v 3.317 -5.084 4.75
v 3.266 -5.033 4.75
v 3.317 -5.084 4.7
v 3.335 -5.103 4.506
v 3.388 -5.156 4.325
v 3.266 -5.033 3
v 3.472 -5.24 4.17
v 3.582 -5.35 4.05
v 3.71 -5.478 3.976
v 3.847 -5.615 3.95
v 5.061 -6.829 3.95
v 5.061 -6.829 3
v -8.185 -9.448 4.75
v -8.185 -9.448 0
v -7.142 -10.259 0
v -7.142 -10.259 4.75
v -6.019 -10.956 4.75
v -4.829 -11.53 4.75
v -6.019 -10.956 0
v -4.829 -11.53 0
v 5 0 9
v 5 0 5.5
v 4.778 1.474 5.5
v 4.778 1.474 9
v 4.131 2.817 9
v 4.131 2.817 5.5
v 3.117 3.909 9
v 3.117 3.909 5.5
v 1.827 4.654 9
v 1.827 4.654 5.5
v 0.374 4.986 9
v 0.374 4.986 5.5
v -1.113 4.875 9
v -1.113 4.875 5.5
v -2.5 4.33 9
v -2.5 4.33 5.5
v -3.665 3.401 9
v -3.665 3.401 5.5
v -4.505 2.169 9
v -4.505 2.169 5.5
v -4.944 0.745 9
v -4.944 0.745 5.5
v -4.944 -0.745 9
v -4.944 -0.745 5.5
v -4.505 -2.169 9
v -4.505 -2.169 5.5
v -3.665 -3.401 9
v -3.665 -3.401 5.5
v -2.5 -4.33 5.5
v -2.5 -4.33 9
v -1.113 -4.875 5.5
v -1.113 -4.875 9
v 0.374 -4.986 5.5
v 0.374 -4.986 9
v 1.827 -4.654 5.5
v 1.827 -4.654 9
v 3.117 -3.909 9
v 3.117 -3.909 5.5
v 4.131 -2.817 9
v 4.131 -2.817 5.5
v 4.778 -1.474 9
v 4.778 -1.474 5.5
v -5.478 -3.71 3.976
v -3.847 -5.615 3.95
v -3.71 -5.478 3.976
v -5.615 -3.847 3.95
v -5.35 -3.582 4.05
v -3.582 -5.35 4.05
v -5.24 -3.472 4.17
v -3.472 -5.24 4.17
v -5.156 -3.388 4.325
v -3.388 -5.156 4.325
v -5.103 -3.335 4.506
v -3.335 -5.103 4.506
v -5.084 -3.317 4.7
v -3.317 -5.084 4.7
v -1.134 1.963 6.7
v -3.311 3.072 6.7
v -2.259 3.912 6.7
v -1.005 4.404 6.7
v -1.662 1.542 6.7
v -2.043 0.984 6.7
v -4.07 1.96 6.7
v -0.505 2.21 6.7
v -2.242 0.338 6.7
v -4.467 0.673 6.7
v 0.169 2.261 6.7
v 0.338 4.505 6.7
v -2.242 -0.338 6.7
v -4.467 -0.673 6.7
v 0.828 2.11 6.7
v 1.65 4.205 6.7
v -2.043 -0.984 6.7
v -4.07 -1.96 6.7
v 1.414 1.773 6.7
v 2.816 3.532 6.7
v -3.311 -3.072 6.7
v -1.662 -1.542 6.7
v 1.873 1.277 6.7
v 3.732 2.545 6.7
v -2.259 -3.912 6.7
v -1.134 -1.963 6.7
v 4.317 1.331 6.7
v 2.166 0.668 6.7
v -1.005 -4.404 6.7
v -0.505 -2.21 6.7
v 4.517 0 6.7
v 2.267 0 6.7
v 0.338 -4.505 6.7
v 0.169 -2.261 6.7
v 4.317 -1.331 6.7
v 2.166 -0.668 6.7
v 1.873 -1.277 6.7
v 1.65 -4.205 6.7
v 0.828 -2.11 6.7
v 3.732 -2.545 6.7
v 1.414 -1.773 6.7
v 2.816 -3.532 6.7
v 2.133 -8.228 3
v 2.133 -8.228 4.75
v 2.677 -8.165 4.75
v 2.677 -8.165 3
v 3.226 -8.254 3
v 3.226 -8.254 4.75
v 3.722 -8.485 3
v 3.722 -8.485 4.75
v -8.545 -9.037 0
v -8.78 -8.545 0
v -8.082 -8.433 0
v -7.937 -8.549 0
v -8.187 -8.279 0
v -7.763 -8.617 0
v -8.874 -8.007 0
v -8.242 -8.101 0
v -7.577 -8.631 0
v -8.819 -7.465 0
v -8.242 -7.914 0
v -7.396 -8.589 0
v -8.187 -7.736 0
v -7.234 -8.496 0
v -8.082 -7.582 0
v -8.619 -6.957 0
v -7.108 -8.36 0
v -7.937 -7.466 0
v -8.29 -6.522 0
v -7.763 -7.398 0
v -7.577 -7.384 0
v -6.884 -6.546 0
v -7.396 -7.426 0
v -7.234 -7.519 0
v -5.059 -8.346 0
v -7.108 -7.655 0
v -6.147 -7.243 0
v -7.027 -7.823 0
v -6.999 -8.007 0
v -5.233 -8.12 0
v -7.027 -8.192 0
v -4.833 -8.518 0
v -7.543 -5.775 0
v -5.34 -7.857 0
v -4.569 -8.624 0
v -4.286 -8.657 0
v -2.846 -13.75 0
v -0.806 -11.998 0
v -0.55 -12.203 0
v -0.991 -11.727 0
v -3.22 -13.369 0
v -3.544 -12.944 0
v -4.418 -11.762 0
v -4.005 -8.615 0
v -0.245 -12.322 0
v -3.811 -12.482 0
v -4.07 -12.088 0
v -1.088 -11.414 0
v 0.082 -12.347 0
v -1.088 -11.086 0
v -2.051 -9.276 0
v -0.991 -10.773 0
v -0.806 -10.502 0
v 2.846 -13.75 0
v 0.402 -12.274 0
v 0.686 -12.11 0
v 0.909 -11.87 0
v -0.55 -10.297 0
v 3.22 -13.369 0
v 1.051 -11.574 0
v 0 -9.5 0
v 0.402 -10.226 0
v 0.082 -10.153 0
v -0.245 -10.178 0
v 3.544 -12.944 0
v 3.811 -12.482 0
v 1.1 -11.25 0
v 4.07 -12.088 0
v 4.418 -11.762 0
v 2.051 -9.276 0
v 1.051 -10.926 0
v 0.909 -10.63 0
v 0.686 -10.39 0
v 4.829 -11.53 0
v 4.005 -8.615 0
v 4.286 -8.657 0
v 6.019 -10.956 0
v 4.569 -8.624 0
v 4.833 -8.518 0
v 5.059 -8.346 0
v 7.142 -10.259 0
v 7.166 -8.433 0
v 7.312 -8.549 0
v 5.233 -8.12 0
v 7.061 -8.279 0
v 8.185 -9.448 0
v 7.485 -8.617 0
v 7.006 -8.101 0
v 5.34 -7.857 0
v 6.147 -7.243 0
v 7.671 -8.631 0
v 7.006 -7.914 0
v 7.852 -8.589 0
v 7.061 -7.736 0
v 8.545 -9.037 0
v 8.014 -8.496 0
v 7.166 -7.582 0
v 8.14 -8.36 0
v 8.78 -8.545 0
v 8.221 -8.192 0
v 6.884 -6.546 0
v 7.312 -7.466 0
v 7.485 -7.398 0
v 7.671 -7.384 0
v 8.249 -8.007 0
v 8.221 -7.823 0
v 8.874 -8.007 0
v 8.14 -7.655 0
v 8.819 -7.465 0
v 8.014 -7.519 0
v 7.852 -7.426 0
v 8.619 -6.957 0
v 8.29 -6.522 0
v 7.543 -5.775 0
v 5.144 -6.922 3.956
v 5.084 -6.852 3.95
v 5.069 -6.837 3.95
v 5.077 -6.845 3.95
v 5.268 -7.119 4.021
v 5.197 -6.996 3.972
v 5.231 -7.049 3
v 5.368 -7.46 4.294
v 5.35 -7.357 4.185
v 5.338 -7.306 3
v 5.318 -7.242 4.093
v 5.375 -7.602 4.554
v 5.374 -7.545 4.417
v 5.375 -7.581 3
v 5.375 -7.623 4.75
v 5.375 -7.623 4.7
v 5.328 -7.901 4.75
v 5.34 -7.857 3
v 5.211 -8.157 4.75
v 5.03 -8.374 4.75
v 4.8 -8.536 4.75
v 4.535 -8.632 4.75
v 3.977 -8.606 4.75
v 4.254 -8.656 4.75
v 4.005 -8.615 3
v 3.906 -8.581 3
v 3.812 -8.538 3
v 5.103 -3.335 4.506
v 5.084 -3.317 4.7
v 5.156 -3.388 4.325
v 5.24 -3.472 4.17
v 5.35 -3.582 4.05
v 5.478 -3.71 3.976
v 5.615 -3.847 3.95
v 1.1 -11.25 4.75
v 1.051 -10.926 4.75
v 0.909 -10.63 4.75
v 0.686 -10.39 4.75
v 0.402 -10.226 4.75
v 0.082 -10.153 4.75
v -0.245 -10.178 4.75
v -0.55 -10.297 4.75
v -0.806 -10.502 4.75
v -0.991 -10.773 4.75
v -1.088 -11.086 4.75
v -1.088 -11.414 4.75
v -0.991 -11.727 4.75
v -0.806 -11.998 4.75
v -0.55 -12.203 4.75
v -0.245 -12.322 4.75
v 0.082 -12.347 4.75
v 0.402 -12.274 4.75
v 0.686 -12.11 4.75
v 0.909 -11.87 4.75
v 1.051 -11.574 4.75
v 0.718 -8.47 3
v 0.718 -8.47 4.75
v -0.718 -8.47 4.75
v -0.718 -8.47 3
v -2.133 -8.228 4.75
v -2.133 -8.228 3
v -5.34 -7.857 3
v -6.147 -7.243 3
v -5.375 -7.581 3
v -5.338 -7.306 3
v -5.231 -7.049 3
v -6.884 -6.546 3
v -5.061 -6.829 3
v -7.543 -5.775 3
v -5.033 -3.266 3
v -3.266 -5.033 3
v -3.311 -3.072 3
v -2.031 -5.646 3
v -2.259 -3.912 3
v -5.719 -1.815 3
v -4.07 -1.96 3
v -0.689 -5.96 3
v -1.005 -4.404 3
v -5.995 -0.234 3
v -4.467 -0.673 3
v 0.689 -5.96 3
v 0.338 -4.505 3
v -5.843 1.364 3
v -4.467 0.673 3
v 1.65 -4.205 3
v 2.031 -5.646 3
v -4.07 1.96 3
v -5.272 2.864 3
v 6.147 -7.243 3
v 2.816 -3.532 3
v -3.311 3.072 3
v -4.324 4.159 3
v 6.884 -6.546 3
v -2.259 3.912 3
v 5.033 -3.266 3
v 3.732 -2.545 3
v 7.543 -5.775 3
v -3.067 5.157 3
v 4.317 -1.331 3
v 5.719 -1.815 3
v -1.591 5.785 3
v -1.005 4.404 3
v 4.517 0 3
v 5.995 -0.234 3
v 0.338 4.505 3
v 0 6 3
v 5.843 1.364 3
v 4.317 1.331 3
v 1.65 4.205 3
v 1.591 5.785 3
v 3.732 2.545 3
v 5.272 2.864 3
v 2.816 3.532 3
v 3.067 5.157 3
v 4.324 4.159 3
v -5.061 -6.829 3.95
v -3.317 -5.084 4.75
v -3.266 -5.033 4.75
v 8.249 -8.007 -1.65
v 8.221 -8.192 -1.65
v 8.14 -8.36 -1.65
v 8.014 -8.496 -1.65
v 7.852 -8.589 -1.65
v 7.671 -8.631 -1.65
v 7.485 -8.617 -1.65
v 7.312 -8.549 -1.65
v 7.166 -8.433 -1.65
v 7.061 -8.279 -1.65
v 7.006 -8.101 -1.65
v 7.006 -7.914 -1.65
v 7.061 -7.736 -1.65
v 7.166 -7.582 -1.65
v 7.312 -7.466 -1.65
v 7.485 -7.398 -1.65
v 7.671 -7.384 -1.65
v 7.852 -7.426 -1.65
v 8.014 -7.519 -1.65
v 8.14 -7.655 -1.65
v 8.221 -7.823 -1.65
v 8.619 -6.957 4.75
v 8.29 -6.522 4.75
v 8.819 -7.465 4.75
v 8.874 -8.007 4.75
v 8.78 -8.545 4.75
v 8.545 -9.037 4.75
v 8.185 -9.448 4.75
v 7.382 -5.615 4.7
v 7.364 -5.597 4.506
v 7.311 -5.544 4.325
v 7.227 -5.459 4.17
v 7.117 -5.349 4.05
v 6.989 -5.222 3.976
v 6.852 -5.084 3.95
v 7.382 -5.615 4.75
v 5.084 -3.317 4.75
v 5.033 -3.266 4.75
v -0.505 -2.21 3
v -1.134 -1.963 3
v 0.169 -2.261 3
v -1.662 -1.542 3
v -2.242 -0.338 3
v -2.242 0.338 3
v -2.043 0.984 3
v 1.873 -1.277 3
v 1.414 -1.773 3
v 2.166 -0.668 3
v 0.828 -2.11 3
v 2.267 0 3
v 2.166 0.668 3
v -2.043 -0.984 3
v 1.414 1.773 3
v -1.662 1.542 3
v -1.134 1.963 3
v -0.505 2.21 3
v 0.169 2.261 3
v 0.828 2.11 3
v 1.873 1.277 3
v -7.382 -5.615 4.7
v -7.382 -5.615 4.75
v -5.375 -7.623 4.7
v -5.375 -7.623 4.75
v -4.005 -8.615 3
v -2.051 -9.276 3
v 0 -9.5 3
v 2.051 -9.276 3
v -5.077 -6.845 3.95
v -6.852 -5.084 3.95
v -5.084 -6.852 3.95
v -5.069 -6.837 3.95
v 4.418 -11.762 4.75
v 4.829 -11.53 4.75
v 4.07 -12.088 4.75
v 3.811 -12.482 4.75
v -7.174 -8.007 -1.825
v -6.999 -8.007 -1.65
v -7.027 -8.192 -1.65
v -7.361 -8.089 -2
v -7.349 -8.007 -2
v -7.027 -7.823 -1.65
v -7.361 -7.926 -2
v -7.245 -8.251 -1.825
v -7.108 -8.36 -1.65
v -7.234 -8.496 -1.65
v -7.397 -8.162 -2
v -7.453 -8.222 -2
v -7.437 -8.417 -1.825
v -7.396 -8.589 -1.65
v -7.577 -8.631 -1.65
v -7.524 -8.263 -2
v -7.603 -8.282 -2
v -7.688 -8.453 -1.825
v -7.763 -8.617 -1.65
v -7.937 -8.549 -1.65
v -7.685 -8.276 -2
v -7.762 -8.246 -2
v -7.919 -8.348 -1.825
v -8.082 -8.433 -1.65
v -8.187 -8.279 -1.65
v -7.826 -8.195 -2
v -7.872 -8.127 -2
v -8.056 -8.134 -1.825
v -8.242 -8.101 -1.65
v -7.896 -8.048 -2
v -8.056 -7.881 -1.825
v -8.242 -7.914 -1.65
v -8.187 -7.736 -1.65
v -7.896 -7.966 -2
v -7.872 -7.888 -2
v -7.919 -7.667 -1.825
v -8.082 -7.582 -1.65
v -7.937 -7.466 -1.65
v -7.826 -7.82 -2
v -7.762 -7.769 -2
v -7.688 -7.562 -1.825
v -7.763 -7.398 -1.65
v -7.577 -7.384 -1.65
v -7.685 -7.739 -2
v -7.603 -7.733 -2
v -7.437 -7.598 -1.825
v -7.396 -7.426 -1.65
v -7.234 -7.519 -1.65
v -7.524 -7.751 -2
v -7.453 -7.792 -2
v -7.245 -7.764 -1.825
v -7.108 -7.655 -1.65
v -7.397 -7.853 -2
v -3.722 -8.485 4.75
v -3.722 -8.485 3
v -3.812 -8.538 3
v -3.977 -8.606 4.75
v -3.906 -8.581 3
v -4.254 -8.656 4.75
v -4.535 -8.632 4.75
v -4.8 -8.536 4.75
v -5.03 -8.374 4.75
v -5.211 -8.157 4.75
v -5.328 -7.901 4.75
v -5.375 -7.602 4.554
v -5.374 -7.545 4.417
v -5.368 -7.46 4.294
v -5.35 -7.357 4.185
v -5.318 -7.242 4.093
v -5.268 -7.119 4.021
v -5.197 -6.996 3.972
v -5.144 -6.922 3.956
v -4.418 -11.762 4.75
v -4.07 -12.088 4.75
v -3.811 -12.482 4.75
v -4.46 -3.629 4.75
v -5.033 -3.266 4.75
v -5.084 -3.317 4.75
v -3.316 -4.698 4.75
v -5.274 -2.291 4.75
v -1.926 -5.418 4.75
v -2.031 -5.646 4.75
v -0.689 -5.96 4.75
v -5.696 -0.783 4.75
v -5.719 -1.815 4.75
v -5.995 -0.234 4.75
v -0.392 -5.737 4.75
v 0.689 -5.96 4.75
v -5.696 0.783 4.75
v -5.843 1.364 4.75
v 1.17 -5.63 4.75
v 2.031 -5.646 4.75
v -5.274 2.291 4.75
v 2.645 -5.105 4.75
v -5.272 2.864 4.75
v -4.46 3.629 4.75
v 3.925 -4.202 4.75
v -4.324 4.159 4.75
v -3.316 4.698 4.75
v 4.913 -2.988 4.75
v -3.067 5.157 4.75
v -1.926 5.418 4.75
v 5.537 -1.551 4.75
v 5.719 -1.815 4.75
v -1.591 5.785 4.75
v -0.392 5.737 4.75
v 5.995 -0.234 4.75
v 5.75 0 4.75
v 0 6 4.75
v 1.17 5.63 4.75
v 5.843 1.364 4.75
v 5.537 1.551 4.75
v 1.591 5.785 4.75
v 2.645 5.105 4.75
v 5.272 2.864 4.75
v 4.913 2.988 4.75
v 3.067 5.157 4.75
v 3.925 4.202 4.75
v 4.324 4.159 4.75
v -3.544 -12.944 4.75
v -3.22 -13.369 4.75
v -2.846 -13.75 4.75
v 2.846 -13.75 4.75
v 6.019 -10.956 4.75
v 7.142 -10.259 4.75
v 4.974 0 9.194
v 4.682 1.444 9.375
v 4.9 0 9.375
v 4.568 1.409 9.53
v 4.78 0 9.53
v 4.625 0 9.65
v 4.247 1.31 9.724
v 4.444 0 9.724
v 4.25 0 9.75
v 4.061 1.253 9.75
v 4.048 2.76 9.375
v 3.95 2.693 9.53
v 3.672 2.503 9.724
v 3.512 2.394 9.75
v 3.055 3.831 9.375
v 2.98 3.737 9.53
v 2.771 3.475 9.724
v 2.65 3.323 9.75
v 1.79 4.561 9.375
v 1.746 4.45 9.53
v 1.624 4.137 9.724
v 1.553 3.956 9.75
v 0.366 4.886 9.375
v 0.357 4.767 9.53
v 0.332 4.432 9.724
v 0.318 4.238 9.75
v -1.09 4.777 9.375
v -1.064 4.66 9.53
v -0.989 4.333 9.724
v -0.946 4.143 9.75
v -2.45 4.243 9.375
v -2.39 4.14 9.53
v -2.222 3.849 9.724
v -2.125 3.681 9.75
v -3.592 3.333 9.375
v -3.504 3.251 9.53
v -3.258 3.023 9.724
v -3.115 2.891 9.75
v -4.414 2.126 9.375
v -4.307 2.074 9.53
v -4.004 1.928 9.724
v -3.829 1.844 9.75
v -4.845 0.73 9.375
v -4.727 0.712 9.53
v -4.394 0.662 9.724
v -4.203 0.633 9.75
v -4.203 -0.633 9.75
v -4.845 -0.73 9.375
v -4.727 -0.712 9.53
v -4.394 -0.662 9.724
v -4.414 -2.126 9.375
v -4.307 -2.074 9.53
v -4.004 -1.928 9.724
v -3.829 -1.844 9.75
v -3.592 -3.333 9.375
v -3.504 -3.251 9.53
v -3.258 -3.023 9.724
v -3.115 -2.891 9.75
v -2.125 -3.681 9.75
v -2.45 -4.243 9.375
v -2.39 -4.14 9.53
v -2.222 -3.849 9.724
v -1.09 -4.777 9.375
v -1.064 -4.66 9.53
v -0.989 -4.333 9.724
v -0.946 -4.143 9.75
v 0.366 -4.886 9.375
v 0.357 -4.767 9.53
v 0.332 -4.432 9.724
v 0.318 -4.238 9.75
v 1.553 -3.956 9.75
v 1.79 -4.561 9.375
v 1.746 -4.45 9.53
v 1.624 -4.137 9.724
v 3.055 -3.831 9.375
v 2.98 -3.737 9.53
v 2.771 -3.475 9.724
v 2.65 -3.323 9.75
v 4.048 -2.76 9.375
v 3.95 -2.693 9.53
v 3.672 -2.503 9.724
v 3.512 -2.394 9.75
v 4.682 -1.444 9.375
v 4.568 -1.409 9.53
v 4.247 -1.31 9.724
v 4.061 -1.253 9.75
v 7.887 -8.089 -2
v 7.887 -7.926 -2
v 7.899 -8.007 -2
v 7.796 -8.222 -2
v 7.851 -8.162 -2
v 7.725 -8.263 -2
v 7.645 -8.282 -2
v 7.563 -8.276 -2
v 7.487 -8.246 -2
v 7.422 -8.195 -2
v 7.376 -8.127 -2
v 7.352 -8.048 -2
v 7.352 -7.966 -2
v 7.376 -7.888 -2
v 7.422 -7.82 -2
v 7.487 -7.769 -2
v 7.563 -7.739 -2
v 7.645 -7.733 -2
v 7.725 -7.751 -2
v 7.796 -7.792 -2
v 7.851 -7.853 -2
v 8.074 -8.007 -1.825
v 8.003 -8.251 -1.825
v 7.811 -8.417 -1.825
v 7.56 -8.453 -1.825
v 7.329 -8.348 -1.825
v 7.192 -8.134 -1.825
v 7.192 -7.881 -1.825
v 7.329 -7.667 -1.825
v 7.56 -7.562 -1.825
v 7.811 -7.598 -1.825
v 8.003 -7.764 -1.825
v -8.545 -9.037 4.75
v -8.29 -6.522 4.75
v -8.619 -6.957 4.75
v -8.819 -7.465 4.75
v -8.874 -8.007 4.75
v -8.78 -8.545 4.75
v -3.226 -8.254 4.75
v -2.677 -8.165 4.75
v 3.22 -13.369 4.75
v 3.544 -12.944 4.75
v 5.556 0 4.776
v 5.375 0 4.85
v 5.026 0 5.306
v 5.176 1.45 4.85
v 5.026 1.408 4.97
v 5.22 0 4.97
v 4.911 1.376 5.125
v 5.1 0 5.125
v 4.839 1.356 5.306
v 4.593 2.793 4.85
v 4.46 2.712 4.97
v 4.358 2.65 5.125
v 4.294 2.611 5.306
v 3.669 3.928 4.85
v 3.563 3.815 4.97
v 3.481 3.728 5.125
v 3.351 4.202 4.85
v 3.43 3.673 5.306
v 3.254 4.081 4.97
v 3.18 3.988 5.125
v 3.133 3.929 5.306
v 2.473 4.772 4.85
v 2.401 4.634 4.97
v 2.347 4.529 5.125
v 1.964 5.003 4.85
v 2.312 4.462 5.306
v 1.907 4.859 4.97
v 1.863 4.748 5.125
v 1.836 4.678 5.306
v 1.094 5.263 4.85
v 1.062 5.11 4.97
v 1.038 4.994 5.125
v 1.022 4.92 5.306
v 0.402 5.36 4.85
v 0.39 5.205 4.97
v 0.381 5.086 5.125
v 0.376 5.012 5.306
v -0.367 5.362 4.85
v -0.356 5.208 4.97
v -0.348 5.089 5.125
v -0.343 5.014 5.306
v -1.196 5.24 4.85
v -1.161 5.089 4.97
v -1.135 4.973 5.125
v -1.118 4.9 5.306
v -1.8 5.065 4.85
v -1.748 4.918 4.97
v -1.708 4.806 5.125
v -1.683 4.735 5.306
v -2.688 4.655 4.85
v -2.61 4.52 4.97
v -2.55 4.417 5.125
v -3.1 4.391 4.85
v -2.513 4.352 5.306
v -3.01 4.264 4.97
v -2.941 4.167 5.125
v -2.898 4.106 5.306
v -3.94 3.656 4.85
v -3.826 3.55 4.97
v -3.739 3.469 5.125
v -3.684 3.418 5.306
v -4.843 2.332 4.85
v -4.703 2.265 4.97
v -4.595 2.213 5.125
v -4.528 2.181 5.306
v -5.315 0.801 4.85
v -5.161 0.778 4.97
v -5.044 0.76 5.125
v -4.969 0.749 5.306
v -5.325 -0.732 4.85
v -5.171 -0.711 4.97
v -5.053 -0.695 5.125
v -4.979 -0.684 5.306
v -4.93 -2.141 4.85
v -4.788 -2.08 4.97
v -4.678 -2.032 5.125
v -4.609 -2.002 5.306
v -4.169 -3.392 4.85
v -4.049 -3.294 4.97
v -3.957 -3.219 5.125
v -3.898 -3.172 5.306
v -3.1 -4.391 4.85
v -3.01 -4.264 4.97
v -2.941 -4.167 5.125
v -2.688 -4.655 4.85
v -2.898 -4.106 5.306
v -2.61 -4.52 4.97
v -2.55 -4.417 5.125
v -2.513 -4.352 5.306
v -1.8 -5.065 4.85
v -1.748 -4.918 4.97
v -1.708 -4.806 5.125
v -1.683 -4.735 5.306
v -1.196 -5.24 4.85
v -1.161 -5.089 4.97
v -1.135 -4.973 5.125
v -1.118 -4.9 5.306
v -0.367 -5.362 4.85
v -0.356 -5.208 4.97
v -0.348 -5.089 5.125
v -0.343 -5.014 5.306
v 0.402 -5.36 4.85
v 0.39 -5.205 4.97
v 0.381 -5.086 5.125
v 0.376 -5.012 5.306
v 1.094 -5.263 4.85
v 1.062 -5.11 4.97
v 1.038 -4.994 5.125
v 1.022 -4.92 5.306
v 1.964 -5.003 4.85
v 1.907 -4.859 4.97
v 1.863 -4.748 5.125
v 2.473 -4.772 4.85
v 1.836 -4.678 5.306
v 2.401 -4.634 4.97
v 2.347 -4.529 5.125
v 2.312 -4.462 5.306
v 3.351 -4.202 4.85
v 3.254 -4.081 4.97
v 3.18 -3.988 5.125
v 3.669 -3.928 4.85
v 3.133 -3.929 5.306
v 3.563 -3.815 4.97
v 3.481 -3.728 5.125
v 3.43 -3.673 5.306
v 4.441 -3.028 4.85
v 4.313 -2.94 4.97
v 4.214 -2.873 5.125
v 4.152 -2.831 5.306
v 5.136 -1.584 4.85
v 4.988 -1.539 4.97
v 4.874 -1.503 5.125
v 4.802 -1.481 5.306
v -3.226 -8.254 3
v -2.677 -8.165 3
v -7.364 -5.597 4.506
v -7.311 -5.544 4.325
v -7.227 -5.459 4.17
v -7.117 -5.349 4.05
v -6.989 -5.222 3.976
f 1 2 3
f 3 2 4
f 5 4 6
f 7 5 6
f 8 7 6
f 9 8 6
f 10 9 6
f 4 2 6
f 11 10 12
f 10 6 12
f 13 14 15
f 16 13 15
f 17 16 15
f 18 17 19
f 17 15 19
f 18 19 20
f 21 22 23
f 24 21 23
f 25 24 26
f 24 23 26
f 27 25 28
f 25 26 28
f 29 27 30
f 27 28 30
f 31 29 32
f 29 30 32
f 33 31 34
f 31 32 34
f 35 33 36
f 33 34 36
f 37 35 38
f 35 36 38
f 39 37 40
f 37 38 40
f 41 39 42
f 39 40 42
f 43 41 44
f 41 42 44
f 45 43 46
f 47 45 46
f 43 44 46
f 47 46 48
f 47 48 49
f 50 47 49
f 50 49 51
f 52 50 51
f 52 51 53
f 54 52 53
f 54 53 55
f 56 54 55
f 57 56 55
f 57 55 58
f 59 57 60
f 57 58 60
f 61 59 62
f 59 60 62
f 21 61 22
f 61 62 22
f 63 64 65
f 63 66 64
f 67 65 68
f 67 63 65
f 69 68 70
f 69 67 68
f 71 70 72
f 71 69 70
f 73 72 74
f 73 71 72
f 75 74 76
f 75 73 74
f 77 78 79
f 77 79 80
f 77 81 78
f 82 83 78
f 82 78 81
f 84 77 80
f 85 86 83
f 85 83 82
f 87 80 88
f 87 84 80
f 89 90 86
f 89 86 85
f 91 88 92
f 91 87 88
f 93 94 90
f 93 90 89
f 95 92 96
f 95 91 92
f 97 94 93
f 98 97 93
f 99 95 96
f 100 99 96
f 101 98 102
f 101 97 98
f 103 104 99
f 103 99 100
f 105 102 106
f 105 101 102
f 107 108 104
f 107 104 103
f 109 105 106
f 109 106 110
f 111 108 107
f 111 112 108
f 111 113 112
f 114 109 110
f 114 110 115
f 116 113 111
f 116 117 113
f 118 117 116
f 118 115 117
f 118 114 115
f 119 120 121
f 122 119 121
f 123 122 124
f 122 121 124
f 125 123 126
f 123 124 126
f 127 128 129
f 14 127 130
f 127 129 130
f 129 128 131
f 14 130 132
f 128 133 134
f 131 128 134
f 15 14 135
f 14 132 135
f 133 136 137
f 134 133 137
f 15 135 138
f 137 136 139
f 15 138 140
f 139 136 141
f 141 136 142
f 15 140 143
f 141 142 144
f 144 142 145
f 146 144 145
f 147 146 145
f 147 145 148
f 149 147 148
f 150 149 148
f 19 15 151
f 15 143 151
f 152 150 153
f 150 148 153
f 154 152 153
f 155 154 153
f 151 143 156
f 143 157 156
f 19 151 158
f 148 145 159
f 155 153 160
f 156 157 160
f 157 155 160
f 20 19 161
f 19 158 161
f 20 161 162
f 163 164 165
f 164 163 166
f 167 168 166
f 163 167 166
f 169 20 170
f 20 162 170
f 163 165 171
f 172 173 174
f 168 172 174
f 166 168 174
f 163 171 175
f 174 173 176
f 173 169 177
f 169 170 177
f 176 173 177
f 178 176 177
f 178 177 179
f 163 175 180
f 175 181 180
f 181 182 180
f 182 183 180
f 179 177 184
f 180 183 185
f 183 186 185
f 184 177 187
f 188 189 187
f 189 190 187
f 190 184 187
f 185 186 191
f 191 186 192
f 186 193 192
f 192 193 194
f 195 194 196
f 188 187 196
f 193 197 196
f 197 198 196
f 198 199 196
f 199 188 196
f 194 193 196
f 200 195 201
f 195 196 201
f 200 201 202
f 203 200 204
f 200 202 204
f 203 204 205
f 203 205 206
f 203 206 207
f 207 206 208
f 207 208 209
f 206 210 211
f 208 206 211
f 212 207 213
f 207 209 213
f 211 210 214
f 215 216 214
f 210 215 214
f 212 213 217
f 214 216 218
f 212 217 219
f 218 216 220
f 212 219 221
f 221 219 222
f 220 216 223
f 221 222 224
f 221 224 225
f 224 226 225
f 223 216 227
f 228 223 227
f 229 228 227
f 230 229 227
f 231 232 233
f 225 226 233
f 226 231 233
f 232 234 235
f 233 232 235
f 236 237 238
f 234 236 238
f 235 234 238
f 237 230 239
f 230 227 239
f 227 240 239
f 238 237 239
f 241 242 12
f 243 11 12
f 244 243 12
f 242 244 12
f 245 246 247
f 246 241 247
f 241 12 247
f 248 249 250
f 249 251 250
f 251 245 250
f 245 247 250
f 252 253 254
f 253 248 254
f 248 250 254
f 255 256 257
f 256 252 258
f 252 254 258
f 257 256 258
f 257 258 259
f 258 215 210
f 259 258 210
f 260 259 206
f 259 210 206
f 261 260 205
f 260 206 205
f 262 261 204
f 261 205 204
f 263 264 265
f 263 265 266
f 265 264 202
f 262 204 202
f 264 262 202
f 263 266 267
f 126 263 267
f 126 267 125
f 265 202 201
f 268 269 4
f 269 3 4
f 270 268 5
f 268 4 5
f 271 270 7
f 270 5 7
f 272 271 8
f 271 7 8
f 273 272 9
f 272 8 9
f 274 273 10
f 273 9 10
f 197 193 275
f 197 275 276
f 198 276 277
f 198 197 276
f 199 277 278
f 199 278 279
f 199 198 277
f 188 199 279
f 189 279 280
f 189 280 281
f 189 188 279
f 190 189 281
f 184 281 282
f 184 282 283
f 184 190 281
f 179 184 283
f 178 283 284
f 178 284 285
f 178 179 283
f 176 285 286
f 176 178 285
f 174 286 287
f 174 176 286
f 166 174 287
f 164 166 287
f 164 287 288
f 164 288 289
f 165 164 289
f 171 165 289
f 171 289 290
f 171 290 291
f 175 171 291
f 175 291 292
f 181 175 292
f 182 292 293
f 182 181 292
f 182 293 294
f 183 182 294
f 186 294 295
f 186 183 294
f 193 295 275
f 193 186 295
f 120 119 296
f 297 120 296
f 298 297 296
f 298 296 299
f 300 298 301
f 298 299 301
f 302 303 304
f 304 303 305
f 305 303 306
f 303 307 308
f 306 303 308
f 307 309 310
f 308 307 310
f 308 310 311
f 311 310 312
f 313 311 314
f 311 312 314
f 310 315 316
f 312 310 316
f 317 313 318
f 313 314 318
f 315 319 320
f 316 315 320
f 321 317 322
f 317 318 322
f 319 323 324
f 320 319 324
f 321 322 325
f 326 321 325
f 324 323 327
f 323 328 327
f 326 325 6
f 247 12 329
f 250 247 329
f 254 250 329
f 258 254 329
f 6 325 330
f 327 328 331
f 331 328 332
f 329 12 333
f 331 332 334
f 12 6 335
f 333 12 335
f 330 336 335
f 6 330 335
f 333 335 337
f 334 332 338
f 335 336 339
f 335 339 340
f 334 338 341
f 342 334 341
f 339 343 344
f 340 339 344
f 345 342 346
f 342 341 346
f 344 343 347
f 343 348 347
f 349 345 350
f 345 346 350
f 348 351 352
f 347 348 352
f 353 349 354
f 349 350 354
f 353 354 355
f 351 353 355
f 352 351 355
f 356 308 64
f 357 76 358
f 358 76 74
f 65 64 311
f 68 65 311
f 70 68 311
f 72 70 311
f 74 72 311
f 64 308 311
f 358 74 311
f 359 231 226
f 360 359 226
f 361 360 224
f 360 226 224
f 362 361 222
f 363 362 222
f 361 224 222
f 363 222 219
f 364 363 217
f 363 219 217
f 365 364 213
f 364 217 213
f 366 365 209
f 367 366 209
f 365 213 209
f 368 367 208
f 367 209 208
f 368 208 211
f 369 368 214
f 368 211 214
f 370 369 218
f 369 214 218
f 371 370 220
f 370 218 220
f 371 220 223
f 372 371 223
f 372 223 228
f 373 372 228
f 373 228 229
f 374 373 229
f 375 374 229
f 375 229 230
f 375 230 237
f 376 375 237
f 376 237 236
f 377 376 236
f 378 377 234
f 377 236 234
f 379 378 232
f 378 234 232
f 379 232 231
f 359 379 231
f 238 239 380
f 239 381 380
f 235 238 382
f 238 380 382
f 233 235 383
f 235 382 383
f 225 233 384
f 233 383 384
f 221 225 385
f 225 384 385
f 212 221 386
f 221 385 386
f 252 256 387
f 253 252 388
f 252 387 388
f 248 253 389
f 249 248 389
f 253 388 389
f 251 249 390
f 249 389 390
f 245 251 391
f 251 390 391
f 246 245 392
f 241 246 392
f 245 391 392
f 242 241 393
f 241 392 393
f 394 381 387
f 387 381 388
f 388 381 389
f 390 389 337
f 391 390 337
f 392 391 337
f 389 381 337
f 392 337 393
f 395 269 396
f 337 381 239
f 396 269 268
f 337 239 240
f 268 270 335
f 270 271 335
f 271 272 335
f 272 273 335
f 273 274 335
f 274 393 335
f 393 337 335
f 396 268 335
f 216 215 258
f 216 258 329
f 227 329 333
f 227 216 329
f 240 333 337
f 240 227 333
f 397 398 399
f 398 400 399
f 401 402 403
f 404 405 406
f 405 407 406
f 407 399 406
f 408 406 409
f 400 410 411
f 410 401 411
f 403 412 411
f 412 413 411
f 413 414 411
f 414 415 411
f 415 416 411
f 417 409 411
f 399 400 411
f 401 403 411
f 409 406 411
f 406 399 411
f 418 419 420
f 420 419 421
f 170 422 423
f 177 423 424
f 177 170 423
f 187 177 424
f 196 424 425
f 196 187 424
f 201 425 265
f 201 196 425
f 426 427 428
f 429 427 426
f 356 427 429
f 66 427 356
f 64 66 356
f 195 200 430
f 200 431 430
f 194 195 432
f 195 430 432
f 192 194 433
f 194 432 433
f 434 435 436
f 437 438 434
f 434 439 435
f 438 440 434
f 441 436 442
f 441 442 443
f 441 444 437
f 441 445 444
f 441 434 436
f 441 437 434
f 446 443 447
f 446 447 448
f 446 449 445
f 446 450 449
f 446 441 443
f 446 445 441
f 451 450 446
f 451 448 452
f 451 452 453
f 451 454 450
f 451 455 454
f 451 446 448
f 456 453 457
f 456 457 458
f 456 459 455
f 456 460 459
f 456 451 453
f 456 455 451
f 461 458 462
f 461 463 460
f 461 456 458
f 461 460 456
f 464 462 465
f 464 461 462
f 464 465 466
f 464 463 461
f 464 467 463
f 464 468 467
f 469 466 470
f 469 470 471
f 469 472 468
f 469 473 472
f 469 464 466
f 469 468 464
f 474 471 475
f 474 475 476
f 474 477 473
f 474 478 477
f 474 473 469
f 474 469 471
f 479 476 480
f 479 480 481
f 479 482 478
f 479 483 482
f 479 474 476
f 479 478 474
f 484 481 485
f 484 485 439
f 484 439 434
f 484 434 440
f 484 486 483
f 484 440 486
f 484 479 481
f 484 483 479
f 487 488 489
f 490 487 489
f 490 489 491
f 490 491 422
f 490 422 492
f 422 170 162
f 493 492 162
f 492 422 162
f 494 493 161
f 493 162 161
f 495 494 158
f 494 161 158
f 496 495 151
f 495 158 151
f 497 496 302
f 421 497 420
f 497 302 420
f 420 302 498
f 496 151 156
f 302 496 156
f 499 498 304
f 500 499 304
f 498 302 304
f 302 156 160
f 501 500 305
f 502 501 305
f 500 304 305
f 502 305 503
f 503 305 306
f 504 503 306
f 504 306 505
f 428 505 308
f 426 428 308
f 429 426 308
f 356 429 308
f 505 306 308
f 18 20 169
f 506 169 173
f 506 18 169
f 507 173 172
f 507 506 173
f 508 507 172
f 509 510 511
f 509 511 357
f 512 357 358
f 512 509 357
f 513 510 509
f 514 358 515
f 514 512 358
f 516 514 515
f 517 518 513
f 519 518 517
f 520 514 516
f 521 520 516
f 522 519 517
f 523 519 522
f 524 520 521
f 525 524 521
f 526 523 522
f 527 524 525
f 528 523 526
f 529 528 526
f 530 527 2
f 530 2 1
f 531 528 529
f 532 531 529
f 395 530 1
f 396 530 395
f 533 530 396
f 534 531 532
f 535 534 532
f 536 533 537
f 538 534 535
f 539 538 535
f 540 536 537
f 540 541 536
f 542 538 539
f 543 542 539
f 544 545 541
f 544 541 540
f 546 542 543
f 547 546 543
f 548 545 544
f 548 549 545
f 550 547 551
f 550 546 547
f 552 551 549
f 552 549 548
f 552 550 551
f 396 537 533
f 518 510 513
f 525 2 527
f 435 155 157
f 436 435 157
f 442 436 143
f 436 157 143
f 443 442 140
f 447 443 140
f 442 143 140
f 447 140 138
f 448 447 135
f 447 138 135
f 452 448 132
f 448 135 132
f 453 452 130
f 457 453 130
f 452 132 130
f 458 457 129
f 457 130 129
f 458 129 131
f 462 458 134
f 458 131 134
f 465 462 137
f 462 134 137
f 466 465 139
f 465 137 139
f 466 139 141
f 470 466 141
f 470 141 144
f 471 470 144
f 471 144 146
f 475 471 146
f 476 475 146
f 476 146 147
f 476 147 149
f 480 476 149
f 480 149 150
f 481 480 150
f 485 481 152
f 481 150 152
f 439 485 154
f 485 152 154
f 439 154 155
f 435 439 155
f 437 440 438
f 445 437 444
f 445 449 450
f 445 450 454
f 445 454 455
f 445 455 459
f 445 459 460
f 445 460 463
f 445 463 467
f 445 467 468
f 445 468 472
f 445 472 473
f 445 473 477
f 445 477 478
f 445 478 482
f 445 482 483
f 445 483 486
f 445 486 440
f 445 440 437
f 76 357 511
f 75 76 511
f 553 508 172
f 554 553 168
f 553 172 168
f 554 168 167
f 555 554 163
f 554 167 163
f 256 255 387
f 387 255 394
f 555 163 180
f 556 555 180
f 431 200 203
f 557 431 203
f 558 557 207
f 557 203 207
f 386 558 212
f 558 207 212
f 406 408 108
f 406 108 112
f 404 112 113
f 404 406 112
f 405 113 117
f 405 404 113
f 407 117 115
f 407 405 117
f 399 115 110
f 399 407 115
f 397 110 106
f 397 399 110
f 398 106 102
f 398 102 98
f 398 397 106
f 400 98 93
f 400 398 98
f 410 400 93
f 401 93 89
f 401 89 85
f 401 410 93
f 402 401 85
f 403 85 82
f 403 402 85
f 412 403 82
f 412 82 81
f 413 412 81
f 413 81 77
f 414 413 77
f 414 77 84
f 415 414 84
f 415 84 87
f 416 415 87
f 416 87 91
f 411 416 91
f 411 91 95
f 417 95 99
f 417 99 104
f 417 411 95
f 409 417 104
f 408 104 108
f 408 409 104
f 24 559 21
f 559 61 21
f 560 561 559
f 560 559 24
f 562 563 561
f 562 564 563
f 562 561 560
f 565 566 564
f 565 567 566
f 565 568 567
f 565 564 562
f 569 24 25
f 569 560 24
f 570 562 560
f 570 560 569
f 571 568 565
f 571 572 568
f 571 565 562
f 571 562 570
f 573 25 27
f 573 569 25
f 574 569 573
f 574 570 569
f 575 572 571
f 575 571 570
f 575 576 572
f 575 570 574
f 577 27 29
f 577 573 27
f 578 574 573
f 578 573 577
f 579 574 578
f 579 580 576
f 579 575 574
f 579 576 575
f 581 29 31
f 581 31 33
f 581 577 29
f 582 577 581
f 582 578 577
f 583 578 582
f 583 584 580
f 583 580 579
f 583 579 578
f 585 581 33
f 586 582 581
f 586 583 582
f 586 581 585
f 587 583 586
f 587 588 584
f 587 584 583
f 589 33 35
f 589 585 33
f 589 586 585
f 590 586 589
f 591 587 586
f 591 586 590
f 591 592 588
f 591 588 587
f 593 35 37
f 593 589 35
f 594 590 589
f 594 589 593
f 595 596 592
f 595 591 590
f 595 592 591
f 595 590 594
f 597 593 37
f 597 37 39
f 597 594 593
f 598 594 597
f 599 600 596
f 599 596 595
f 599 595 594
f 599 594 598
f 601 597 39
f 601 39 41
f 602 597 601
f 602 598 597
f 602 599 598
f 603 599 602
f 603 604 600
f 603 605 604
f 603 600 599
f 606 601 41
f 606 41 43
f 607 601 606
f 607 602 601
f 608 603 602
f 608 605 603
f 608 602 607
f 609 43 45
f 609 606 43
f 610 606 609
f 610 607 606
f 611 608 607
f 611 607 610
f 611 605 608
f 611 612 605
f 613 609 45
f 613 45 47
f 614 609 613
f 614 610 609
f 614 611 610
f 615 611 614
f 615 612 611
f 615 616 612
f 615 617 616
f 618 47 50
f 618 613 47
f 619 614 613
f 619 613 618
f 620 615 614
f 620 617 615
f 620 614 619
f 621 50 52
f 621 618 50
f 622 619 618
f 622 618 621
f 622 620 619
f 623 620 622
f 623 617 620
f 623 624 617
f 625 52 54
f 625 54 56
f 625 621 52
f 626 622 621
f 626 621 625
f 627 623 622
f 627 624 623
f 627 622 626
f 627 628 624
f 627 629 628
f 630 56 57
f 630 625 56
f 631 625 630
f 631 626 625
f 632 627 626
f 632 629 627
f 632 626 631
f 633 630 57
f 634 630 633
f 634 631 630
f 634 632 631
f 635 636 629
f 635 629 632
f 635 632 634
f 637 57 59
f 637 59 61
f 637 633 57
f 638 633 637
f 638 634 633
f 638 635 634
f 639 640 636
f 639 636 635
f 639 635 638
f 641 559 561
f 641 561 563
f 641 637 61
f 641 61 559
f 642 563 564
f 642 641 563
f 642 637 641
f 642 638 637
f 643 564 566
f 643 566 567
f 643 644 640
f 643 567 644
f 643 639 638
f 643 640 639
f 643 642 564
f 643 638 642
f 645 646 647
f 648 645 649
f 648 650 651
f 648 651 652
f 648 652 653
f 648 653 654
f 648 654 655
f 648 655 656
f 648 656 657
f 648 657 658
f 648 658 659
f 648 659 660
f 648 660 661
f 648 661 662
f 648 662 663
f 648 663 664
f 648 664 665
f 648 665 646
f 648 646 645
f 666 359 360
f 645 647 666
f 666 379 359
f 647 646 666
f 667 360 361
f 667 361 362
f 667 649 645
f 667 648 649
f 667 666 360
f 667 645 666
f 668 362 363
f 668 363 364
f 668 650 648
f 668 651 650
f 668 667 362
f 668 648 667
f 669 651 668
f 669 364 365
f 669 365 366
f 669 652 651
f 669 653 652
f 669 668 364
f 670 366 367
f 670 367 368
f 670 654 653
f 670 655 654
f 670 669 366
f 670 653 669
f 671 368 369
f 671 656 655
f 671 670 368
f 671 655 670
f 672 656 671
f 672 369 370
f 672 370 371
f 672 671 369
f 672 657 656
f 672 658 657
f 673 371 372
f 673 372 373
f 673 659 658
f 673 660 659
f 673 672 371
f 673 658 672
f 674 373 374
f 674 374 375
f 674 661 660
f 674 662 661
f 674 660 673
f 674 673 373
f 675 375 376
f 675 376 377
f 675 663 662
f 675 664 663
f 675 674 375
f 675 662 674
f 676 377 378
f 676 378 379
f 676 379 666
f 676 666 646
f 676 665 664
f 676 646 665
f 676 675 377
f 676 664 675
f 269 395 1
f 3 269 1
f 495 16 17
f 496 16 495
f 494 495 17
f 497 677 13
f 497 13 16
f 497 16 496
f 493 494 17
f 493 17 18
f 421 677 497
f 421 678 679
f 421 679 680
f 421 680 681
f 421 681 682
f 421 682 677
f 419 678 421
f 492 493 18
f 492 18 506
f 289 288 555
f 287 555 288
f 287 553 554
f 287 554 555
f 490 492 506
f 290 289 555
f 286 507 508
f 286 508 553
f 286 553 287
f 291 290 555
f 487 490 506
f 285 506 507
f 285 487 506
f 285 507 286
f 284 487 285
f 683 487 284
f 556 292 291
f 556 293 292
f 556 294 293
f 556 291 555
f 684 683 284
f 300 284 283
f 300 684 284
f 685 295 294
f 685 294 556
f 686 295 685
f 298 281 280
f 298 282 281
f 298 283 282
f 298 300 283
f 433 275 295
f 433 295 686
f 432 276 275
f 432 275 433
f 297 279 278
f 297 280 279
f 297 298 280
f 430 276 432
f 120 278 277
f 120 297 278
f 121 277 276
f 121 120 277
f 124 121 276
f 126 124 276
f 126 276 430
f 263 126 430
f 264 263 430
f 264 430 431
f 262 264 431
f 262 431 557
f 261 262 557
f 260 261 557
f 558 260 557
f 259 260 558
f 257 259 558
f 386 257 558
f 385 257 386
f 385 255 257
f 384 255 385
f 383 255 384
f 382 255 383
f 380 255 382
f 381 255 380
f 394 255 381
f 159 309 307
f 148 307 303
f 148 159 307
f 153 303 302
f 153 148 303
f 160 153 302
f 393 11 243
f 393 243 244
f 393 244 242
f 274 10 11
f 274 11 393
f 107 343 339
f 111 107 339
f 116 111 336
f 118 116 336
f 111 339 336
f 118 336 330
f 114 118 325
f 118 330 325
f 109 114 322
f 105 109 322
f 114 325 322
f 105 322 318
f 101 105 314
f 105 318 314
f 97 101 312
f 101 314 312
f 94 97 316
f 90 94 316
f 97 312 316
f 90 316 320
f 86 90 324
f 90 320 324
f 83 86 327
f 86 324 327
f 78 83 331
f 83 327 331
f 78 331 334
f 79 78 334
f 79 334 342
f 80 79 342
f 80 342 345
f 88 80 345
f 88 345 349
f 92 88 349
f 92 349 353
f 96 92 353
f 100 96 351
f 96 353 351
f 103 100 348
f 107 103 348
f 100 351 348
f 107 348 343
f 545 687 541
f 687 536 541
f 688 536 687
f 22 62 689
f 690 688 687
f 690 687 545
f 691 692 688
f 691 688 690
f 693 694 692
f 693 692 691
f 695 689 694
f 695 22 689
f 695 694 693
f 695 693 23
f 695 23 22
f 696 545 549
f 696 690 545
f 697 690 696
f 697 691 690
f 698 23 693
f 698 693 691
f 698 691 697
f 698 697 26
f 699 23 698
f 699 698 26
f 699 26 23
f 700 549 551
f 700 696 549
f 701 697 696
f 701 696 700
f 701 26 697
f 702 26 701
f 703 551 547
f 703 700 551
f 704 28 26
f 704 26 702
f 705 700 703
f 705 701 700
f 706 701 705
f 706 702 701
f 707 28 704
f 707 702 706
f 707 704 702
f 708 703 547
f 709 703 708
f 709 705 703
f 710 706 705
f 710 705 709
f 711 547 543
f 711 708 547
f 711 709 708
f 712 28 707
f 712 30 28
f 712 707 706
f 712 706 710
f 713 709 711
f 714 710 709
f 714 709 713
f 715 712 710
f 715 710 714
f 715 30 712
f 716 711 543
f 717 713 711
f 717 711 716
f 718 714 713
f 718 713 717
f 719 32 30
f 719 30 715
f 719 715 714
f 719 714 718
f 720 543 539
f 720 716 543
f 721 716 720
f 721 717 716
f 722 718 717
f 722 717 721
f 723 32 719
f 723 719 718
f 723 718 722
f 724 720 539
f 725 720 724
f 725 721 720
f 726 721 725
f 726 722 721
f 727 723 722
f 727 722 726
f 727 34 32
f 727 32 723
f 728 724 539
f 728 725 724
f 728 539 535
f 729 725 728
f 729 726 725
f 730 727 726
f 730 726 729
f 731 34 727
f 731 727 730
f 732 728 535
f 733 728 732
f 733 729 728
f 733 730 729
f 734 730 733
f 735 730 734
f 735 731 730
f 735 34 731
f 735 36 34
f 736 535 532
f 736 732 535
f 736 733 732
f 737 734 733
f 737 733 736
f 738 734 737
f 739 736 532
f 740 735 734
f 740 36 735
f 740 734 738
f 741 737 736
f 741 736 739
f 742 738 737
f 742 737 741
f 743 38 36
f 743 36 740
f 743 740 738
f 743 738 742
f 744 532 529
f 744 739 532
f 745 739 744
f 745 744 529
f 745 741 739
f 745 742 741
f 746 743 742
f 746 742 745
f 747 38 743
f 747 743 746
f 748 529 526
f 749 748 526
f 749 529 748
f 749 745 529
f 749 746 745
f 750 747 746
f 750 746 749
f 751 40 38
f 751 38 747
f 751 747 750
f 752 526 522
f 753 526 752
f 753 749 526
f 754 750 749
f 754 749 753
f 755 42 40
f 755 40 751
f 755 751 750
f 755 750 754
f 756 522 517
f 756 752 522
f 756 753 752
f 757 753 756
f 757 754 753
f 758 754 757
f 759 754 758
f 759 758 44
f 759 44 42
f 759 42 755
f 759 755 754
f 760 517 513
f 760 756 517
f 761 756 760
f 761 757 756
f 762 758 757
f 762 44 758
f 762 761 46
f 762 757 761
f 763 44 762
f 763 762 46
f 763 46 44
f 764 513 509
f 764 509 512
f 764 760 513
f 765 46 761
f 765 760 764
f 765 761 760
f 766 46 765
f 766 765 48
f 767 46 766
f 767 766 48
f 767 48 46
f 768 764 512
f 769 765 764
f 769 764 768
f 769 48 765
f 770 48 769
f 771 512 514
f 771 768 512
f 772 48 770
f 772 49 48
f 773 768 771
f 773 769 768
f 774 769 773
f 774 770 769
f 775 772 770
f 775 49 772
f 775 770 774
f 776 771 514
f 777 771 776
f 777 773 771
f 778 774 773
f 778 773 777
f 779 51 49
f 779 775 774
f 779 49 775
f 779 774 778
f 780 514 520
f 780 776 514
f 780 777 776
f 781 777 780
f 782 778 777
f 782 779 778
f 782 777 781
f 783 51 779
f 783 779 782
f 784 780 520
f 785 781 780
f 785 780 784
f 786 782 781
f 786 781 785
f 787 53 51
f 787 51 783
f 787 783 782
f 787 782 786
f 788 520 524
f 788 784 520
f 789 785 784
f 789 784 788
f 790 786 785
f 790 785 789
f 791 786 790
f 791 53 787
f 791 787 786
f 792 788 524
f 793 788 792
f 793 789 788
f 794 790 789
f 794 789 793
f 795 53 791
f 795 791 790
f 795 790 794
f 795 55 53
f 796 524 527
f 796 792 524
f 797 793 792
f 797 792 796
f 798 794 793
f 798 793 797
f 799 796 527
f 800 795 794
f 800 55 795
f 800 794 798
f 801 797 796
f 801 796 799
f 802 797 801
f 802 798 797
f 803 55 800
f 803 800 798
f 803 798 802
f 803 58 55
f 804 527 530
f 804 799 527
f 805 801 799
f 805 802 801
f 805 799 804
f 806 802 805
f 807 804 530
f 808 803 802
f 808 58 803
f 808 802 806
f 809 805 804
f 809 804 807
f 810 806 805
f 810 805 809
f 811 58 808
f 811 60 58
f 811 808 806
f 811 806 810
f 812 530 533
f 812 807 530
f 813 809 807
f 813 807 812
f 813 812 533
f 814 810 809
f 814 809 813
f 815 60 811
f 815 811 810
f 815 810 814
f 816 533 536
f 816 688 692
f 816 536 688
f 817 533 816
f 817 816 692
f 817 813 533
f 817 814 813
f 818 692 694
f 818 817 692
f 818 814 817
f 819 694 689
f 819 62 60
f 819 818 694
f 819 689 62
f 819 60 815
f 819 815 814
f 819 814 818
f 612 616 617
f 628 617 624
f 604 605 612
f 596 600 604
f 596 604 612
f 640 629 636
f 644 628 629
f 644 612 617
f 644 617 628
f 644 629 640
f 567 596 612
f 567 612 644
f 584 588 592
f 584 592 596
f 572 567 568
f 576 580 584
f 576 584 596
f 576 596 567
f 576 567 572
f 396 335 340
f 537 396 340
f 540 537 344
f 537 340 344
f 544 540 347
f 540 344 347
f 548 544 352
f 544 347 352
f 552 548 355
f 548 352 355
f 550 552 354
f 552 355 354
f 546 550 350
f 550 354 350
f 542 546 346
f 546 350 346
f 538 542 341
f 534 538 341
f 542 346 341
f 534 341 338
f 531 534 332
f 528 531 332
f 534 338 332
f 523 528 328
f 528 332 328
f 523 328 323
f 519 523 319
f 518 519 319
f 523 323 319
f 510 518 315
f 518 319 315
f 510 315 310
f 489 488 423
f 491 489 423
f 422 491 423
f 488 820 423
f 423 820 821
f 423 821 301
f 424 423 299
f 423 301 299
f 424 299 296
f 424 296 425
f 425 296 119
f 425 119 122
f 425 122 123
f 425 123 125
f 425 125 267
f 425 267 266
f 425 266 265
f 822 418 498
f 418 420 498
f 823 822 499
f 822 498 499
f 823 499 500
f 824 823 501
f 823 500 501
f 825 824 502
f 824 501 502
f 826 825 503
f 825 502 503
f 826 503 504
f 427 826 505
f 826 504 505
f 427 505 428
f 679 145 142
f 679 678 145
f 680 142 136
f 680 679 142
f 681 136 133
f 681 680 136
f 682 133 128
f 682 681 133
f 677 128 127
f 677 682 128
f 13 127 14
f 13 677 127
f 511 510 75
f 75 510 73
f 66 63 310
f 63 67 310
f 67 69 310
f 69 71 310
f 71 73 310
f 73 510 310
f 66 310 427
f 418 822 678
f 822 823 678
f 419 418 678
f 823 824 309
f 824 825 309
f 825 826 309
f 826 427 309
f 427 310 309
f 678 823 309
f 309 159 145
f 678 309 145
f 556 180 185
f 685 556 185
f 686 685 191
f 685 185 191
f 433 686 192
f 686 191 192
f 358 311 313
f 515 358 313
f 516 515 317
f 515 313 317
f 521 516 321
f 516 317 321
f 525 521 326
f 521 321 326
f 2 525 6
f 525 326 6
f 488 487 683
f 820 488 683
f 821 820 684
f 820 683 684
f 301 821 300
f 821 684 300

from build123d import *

# Parameters (mm, degrees)
F0_R      = 1.1
F1_DEPTH  = 4.75
F2_R      = 5
F3_DEPTH  = 5
F5_R      = 2
F7_DEPTH  = 0.8
F8_R      = 0.75
F9_R      = 9.5
F10_DEPTH = 3
F12_R     = 4.5172071506
F12_R_2   = 2.2672071506
F13_DEPTH = 3.7
F14_R     = 0.625
F15_DEPTH = 2
F16_SIZE  = 0.35


# Not quite as in the source:
# - a feature names something its author has since deleted; it is built from what else it names


with BuildPart() as f1:
    # F0 (on Top) → F1 (new body)
    with BuildSketch(Plane.XY):
        with BuildLine():
            Line((-5.0334316447, -3.2656646917), (-9.6784130262, -7.9106460732))
            ThreePointArc((-9.6784130262, -7.9106460732), (-7.1490584463, -10.2538267653), (-4.0757746589, -11.8168549509))
            ThreePointArc((-4.0757746589, -11.8168549509), (-3.593311946, -12.8676823003), (-2.8459674038, -13.75))
            Line((-2.8459674038, -13.75), (2.8459674038, -13.75))
            ThreePointArc((2.8459674038, -13.75), (3.593311946, -12.8676823003), (4.0757746589, -11.8168549509))
            ThreePointArc((4.0757746589, -11.8168549509), (7.1490584463, -10.2538267653), (9.6784130262, -7.9106460732))
            Line((9.6784130262, -7.9106460732), (5.0334316447, -3.2656646917))
            ThreePointArc((5.0334316447, -3.2656646917), (0, 6), (-5.0334316447, -3.2656646917))
        make_face()
        with Locations((0, -11.25)):
            Circle(F0_R, mode=Mode.SUBTRACT)
        with BuildLine():
            Line((-5.061459087, -6.82922604), (-3.2656646917, -5.0334316447))
            ThreePointArc((-3.2656646917, -5.0334316447), (0, -6), (3.2656646917, -5.0334316447))
            Line((3.2656646917, -5.0334316447), (5.061459087, -6.82922604))
            ThreePointArc((5.061459087, -6.82922604), (4.8326547168, -8.5179809488), (3.2656646917, -7.8480653995))
            ThreePointArc((3.2656646917, -7.8480653995), (0, -8.5003938964), (-3.2656646917, -7.8480653995))
            ThreePointArc((-3.2656646917, -7.8480653995), (-4.8326547168, -8.5179809488), (-5.061459087, -6.82922604))
        make_face(mode=Mode.SUBTRACT)
    extrude(amount=F1_DEPTH)

    # F2 (on face) → F3 (join)
    with BuildSketch(Plane.XY.offset(4.75)):
        Circle(F2_R)
    extrude(amount=F3_DEPTH)

    # F5
    f5_edges = [f1.edges().sort_by_distance(p)[0] for p in [
        (3.265665, -7.848065, 2.375),
        (-3.265665, -7.848065, 2.375),
        (-9.678413, -7.910646, 2.375),
        (-4.075775, -11.816855, 2.375),
        (9.678413, -7.910646, 2.375),
        (4.075775, -11.816855, 2.375),
    ]]
    fillet(f5_edges, radius=F5_R)

    # F6 (on face) → F7 (cut)
    with BuildSketch(Plane.XY.offset(4.75)):
        Polygon((4.3772207939, -8.619861481), (8.619861481, -4.3772207939), (6.2942457002, -2.1069760406), (2.0792905268, -6.3219312139), align=None)
        Polygon((-4.3772207939, -8.619861481), (-2.0792905268, -6.3219312139), (-6.2942457002, -2.1069760406), (-8.619861481, -4.3772207939), align=None)
    extrude(amount=-F7_DEPTH, mode=Mode.SUBTRACT)

    # F8
    f8_edges = [f1.edges().sort_by_distance(p)[0] for p in [
        (4.200611, -4.200611, 3.95),
        (-4.200611, -4.200611, 3.95),
        (-5, 0, 4.75),
        (-5, 0, 9.75),
        (6.378475, -6.618607, 3.95),
        (-6.378475, -6.618607, 3.95),
    ]]
    fillet(f8_edges, radius=F8_R)

    # F9 (on Top) → F10 (cut)
    with BuildSketch(Plane.XY):
        Circle(F9_R)
    extrude(amount=F10_DEPTH, mode=Mode.SUBTRACT)

    # F12 (on face) → F13 (cut)
    with BuildSketch(Plane(origin=(0, 0, 3), x_dir=(1, 0, 0), z_dir=(0, 0, -1))):
        Circle(F12_R)
        Circle(F12_R_2, mode=Mode.SUBTRACT)
    extrude(amount=-F13_DEPTH, mode=Mode.SUBTRACT)

    # F14 (on face) → F15 (join)
    with BuildSketch(Plane(origin=(0, 0, 0), x_dir=(1, 0, 0), z_dir=(0, 0, -1))):
        with Locations((7.6240489866, 8.007460935)):
            Circle(F14_R)
        with Locations((-7.6240489866, 8.007460935)):
            Circle(F14_R)
    extrude(amount=F15_DEPTH)

    # F16
    f16_edges = [f1.edges().sort_by_distance(p)[0] for p in [
        (6.999049, -8.007461, -2),
        (-8.249049, -8.007461, -2),
    ]]
    chamfer(f16_edges, length=F16_SIZE)


solid = f1.part
